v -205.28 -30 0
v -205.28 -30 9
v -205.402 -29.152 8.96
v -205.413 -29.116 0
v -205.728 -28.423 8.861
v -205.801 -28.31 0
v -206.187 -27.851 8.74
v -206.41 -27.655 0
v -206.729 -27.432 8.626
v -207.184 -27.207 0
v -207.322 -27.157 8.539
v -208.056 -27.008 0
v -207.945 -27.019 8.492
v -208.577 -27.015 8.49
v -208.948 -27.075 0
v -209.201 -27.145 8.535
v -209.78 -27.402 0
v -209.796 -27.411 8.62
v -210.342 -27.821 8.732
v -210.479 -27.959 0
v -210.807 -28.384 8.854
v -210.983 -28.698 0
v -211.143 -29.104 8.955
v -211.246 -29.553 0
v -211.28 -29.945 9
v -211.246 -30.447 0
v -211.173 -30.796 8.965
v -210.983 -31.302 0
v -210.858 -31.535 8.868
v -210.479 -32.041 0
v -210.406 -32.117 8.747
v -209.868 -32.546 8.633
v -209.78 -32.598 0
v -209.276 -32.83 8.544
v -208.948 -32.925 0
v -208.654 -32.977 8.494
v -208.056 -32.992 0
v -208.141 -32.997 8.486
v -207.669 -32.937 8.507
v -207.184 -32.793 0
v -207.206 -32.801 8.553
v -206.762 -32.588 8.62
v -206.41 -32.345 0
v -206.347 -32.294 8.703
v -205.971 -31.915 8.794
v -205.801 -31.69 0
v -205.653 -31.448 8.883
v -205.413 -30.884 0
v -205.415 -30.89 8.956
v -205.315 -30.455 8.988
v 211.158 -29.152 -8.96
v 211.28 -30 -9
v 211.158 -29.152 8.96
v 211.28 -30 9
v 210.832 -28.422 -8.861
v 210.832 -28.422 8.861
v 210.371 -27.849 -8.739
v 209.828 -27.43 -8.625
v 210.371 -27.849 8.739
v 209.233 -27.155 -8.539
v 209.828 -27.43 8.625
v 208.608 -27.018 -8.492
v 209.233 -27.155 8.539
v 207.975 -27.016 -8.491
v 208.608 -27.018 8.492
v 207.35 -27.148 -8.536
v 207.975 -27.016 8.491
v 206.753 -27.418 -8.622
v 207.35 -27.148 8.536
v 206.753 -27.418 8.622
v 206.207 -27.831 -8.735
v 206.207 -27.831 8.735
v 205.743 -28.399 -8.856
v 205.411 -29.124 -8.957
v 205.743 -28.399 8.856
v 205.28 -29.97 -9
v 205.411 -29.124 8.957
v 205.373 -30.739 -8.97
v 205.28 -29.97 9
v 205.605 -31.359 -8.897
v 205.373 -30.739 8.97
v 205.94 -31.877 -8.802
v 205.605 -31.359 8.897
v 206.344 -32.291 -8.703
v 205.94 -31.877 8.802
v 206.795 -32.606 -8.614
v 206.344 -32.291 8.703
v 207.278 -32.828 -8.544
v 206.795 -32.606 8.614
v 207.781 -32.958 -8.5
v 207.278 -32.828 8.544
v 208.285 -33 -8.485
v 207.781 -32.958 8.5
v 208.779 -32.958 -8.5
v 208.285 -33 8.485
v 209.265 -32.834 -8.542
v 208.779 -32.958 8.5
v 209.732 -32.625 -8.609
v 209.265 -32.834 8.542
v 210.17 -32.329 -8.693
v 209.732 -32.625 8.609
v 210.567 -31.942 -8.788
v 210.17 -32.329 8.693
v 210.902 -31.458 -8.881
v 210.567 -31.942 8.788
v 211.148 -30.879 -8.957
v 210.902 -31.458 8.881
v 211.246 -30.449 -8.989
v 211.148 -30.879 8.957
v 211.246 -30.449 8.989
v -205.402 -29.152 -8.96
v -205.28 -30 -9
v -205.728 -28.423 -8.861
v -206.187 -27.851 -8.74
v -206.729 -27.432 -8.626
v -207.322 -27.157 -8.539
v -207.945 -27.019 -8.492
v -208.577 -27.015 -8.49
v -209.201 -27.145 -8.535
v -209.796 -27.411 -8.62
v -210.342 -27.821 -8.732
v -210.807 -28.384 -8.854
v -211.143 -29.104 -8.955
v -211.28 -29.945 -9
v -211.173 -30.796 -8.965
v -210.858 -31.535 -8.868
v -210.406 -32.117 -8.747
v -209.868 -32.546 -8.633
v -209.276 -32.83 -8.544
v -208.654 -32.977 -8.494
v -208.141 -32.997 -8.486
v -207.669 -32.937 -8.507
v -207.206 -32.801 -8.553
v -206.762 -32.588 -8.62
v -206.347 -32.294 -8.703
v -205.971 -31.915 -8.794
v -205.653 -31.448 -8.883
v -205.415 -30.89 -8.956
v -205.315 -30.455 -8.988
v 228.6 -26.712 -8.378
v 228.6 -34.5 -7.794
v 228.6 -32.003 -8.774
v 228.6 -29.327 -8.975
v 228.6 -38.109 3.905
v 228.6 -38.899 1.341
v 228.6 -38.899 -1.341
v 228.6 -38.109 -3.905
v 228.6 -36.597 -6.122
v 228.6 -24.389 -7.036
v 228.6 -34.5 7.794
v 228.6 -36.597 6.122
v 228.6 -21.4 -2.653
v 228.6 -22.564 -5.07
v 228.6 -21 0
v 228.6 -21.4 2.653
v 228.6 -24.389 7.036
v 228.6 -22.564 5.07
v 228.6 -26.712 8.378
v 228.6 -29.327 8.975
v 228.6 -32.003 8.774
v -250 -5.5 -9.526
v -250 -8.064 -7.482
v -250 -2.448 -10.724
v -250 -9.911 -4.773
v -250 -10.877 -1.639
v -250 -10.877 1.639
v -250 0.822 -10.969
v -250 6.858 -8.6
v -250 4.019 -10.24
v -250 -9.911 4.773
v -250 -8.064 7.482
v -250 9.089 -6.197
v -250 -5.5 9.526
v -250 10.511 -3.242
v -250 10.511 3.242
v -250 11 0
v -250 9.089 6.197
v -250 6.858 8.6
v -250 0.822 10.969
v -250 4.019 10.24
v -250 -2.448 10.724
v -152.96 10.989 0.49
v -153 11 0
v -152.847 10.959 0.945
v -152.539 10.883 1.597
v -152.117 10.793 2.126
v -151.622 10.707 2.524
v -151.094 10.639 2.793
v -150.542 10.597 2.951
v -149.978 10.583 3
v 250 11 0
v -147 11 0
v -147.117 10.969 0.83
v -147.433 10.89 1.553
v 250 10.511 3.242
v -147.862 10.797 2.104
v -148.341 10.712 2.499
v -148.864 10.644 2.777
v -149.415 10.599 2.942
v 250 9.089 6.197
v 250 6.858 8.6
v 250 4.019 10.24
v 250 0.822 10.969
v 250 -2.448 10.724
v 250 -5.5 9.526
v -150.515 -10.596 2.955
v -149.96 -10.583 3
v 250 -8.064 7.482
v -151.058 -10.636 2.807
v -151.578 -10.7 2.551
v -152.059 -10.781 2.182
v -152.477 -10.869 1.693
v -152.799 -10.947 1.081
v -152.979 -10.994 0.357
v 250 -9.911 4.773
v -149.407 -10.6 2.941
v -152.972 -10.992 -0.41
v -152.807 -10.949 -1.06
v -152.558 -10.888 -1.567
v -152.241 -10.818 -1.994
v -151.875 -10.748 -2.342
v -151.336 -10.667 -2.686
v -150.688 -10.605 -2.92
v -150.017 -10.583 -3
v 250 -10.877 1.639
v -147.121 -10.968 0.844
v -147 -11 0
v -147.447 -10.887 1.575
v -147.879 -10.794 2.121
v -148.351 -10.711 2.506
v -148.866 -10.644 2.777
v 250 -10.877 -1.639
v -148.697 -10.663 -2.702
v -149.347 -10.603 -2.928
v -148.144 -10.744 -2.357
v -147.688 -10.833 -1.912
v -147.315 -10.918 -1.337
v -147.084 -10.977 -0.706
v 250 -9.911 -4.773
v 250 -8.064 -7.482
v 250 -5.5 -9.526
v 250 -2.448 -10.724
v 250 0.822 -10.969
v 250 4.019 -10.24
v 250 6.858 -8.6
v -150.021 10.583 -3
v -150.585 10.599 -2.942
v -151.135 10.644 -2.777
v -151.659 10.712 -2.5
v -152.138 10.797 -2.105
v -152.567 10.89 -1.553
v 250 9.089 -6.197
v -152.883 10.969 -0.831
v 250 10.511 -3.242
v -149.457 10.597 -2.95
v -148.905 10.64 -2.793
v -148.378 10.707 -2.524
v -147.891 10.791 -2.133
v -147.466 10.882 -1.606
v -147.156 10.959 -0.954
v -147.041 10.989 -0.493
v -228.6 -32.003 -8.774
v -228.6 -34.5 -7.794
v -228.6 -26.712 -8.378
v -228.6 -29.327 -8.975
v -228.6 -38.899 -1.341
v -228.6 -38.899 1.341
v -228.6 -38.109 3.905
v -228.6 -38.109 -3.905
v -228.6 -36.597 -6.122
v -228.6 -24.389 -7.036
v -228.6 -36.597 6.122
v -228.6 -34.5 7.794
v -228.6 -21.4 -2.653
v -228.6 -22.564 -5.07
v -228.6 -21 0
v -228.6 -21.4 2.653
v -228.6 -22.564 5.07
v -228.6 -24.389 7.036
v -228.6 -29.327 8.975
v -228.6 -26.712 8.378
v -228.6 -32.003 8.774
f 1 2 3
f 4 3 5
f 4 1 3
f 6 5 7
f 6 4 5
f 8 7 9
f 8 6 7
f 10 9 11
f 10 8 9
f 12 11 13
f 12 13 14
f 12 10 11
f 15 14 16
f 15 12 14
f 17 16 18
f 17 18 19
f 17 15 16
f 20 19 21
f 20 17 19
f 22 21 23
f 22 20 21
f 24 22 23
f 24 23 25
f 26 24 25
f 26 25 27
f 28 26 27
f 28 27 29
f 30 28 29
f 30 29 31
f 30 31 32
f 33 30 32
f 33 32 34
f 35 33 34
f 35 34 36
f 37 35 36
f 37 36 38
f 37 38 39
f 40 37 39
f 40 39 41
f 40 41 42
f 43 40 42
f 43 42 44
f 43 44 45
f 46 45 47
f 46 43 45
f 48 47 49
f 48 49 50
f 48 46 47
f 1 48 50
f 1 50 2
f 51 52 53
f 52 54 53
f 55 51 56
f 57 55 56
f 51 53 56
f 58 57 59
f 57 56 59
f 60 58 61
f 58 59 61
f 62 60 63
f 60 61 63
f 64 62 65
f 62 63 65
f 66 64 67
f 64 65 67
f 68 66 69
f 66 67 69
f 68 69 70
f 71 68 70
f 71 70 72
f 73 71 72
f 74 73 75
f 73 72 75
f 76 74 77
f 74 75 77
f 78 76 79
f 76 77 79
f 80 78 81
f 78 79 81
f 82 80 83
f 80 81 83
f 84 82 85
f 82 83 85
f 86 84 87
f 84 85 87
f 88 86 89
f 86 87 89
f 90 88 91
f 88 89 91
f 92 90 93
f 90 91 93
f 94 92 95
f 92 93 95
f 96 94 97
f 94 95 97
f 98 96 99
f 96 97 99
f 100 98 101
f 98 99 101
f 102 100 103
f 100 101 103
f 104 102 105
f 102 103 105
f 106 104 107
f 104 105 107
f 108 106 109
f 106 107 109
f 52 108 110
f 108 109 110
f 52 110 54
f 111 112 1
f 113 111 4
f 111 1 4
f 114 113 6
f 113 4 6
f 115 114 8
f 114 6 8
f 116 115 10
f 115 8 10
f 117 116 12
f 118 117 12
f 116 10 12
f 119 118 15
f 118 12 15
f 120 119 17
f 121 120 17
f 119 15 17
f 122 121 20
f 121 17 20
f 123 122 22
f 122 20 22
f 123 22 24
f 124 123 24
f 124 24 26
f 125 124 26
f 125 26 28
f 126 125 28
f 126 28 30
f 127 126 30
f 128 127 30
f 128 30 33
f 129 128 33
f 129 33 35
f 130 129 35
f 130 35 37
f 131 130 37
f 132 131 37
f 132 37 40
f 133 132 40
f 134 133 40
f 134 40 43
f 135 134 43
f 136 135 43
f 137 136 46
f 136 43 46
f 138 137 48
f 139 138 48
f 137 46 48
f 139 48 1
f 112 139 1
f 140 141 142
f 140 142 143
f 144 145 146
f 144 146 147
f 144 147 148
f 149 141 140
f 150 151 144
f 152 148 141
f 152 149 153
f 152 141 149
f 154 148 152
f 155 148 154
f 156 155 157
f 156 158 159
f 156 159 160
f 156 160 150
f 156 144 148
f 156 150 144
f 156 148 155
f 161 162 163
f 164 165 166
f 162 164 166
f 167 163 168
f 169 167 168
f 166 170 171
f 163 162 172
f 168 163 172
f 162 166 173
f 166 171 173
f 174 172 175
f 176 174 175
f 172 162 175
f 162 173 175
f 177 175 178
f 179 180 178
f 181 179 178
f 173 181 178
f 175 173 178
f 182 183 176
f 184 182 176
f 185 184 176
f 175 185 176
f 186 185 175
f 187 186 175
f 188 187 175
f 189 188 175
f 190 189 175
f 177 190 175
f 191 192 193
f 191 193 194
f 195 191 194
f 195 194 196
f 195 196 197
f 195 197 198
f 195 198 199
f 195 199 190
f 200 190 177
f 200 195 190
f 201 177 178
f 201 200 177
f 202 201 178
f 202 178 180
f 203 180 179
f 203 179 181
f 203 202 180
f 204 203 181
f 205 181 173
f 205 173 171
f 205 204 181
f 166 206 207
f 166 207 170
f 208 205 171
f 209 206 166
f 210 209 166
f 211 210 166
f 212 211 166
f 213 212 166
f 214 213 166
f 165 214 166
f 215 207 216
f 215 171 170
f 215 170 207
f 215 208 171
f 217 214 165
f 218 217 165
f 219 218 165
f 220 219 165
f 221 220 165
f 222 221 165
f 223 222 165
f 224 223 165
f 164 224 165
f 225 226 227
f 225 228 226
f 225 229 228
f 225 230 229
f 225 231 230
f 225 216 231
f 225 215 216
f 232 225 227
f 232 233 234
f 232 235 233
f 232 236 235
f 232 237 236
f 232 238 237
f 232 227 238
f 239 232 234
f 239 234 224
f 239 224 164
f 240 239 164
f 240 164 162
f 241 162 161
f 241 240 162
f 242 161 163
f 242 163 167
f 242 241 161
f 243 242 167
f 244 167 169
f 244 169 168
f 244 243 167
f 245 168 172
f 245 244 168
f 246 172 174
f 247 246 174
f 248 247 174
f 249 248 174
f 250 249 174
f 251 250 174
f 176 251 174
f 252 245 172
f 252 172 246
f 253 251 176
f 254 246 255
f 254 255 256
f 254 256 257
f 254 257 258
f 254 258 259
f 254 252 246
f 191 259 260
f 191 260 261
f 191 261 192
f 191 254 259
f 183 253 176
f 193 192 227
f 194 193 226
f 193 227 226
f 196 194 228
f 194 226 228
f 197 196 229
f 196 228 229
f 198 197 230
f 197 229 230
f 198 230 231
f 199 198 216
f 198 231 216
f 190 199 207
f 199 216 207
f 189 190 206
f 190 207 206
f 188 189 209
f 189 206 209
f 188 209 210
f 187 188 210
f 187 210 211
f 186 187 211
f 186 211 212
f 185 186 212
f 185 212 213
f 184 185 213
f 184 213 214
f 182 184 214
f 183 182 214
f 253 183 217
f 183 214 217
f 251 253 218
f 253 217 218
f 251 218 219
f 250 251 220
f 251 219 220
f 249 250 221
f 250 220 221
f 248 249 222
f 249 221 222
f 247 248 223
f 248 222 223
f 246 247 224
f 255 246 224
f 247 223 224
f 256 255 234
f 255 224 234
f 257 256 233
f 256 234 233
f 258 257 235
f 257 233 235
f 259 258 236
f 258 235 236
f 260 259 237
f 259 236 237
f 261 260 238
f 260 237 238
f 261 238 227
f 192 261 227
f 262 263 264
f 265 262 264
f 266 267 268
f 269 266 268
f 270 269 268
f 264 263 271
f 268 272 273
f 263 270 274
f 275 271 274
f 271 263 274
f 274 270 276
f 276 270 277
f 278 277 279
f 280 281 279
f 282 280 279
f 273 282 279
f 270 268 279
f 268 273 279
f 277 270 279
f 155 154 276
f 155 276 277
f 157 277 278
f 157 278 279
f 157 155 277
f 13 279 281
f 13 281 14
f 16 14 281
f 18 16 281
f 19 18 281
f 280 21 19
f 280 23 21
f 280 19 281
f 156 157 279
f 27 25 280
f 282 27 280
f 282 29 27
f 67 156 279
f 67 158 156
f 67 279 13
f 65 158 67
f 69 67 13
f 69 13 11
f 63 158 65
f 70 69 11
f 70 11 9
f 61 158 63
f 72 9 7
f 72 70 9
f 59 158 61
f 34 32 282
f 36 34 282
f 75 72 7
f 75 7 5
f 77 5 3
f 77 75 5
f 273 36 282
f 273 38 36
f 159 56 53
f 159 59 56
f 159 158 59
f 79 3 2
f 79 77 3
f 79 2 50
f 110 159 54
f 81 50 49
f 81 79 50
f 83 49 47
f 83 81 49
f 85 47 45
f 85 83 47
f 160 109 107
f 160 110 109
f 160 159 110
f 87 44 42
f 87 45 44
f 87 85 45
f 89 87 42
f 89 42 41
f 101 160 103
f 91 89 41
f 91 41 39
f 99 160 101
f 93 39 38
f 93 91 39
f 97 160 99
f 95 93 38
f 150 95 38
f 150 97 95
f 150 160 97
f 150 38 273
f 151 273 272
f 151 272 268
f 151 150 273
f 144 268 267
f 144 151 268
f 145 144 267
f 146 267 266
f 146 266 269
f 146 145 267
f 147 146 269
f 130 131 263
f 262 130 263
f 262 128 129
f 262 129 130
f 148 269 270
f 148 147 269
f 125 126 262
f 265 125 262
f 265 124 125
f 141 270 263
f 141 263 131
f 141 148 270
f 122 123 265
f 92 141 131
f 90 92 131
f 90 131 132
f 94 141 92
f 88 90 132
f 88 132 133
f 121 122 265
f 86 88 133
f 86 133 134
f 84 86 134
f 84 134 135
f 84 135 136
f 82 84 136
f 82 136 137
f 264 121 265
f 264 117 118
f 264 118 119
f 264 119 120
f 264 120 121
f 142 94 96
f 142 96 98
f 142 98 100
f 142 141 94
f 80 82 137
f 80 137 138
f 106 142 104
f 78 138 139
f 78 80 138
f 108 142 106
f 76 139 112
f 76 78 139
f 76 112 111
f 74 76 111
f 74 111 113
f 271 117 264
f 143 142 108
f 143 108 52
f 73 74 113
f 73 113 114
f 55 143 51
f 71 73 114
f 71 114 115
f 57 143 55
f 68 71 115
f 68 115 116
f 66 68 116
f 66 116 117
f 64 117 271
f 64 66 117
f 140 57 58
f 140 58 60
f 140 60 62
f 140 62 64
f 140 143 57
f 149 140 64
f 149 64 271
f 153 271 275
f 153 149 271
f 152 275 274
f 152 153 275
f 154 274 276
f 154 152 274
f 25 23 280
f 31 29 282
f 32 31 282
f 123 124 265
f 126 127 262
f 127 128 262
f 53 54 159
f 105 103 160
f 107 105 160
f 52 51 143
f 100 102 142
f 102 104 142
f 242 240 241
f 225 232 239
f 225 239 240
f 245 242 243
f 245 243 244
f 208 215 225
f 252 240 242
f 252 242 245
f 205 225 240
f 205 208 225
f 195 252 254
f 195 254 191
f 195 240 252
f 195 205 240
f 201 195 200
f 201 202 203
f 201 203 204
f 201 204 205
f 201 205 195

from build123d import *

# Parameters (mm, degrees)
F0_R     = 11
F1_DEPTH = 250
F2_R     = 3
F3_DEPTH = 12.7
F0_R_2   = 9
F4_DEPTH = 228.6
F5_R     = 3
F6_DEPTH = 12.7


with BuildPart() as f1:
    # F0 (on Right) → F1 (new body, symmetric)
    with BuildSketch(Plane.YZ):
        Circle(F0_R)
    extrude(amount=F1_DEPTH, both=True)

    # F2 (on Front) → F3 (cut, symmetric)
    with BuildSketch(Plane.XZ):
        with Locations((-150, 0)):
            Circle(F2_R)
    extrude(amount=F3_DEPTH, both=True, mode=Mode.SUBTRACT)


with BuildPart() as f4:
    # F0 (on Right) → F4 (new body, symmetric)
    with BuildSketch(Plane.YZ):
        with Locations((-30, 0)):
            Circle(F0_R_2)
    extrude(amount=F4_DEPTH, both=True)

    # F5 (on Top) → F6 (cut, symmetric)
    with BuildSketch(Plane.XY):
        with Locations((-208.28, -30)):
            Circle(F5_R)
        with Locations((208.28, -30)):
            Circle(F5_R)
    extrude(amount=F6_DEPTH, both=True, mode=Mode.SUBTRACT)


solid = Compound([f1.part, f4.part])
